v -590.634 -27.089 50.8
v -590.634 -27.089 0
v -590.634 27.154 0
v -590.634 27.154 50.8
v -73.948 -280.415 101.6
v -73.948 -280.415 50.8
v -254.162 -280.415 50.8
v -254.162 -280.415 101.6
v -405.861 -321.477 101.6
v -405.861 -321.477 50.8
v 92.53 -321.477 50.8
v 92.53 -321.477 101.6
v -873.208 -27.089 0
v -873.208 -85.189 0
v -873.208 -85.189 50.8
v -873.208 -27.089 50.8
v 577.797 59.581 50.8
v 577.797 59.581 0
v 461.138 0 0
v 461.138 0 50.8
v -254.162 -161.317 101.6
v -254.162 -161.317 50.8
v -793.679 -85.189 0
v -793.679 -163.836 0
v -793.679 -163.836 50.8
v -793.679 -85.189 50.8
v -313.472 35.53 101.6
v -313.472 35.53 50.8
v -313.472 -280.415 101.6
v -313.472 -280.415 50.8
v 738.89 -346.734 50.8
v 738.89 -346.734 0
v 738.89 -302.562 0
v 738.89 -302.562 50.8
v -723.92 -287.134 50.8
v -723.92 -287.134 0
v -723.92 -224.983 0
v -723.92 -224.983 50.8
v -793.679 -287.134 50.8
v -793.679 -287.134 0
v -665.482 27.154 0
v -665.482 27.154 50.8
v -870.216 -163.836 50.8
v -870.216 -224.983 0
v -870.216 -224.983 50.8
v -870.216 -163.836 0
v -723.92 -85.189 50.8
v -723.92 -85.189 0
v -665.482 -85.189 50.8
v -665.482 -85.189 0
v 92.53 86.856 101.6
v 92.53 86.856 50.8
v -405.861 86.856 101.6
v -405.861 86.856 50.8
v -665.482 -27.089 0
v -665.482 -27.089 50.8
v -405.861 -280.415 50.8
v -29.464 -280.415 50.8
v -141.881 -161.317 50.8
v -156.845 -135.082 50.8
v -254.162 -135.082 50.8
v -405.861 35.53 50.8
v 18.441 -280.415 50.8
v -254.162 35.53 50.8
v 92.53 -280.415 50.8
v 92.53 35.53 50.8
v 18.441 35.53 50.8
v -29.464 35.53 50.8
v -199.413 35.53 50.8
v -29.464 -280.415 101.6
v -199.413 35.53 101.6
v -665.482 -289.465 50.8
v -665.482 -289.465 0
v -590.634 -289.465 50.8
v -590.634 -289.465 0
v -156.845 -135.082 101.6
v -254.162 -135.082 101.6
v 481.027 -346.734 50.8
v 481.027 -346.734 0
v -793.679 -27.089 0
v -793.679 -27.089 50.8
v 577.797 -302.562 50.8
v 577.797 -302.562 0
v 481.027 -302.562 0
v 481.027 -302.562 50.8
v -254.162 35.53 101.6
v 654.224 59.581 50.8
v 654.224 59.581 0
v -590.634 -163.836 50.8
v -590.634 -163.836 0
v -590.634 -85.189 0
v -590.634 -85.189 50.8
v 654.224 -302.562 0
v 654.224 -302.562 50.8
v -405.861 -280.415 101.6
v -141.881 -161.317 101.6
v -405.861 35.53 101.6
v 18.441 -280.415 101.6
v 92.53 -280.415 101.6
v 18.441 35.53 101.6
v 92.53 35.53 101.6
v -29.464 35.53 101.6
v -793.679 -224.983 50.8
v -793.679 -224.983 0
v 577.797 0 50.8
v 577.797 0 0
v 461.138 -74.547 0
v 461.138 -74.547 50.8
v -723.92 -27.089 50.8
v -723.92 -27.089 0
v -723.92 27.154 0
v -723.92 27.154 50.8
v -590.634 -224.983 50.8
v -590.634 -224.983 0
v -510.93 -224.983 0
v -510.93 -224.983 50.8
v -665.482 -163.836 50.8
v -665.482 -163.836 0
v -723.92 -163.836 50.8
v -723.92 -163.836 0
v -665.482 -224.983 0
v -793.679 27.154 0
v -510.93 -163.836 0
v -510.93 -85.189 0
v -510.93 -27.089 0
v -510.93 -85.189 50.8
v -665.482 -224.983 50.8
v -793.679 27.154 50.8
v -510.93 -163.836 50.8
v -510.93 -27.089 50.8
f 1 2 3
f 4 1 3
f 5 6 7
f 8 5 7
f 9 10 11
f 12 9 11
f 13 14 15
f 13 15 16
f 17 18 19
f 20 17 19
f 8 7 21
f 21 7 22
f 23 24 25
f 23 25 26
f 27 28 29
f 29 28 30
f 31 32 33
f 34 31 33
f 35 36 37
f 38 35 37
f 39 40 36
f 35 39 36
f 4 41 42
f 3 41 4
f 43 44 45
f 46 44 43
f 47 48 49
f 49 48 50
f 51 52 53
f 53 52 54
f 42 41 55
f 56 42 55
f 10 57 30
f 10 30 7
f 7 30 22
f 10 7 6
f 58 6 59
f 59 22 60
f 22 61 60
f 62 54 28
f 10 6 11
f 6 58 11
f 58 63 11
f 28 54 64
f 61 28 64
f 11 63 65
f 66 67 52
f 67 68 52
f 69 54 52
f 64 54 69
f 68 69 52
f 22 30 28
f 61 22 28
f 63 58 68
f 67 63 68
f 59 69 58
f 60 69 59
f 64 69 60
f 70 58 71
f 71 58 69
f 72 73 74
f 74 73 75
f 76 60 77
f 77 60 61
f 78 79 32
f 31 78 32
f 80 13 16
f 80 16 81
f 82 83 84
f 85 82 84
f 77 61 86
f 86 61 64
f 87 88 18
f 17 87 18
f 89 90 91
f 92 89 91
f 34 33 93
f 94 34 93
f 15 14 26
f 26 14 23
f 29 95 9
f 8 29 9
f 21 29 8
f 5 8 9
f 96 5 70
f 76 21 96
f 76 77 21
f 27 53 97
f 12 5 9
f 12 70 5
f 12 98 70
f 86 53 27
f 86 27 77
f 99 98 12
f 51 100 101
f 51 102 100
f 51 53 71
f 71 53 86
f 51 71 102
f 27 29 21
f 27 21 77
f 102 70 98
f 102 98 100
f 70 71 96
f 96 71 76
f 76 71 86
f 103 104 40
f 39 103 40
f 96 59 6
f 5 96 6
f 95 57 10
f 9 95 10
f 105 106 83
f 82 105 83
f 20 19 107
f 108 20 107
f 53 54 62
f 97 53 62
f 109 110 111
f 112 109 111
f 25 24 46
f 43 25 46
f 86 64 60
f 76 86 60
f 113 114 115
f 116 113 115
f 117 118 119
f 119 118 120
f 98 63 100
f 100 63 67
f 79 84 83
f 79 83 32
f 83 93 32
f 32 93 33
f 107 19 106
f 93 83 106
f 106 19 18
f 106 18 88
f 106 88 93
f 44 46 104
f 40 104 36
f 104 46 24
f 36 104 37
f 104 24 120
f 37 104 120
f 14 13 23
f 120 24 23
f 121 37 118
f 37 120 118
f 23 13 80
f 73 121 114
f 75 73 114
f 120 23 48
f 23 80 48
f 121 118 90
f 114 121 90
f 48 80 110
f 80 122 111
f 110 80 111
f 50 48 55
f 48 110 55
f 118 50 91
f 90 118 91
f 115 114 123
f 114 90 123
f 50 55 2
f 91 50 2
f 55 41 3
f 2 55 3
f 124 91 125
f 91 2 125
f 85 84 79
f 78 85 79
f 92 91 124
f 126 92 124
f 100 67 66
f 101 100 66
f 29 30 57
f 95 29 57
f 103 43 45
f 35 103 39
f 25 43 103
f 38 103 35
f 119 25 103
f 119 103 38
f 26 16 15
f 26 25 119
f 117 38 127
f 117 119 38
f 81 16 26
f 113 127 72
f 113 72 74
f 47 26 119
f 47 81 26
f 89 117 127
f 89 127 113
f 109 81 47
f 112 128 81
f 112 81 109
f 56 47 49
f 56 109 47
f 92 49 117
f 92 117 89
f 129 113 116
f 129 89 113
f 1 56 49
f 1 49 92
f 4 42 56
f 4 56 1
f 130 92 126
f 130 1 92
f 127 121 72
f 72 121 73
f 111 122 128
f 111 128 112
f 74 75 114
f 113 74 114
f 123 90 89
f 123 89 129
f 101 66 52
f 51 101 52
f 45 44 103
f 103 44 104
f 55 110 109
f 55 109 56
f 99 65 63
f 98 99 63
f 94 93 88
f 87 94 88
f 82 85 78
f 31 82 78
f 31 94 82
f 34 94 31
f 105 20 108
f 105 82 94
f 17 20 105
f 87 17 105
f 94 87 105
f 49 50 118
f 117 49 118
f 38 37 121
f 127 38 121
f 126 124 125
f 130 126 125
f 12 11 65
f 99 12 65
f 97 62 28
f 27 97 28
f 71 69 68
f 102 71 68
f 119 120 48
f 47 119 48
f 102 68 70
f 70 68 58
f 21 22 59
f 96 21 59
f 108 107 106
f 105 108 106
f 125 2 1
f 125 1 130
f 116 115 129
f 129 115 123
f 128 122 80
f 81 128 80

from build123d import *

# Parameters (mm, degrees)
F0_W      = 59.3109130859
F0_H      = 315.944686532
F1_DEPTH  = 50.8
F2_W      = 47.9049701244
F2_H      = 315.944686532
F3_DEPTH  = 2.54
F4_DEPTH  = 50.8
F5_W      = 69.7591304779
F5_H      = 54.2430207133
F5_H_2    = 58.1001080573
F5_W_2    = 79.5288085938
F5_W_3    = 74.8479366302
F5_W_4    = 58.4374070168
F5_W_5    = 79.7038674355
F5_H_3    = 78.646697104
F5_H_4    = 61.1479729414
F5_H_5    = 64.4819140434
F5_H_6    = 62.1507763863
F5_W_6    = 76.5372514725
F6_DEPTH  = 50.8
F8_DEPTH  = 50.8
F11_DEPTH = 50.8


with BuildPart() as f1:
    # F0 (on Top) → F1 (new body)
    with BuildSketch(Plane.XY):
        Polygon((317.2763288021, 86.8562683463), (-405.860632658, 86.8562683463), (-405.860632658, 35.5295091867), (-313.4724795818, 35.5295091867), (-254.1615664959, 35.5295091867), (317.2763288021, 35.5295091867), align=None)
        with Locations((-283.8170230389, -122.4428340793)):
            Rectangle(F0_W, F0_H)
        Polygon((-254.1615664959, -280.4151773453), (-313.4724795818, -280.4151773453), (-405.860632658, -280.4151773453), (-405.860632658, -321.4765787125), (329.8228383064, -321.4765787125), (329.8228383064, -280.4151773453), align=None)
    extrude(amount=F1_DEPTH)

    # F2 (on face) → F3 (join)
    with BuildSketch(Plane.XY.offset(50.8)):
        Polygon((-141.8810272457, -161.3167375326), (-156.8449797478, -135.0824683905), (-254.1615664959, -135.0824683905), (-254.1615664959, -161.3167375326), align=None)
        Polygon((-199.4130164385, 35.5295091867), (-254.1615664959, 35.5295091867), (-156.8449797478, -135.0824683905), (-141.8810272457, -161.3167375326), (-73.9476159215, -280.4151773453), (-29.4644292444, -280.4151773453), align=None)
        with Locations((-5.5119441822, -122.4428340793)):
            Rectangle(F2_W, F2_H)
    extrude(amount=-F3_DEPTH)

    # F4 (add): faces of the model
    f4_faces = [f1.faces().sort_by_distance(p)[0] for p in [
        (-5.5119441822, -122.4428340793, 48.26),
        (-44.2921519279, 78.4421974919, 50.8),
    ]]
    extrude(f4_faces, amount=F4_DEPTH, dir=(0, 0, -1))


with BuildPart() as f6:
    # F5 (on Top) → F6 (new body)
    with BuildSketch(Plane.XY):
        with Locations((-758.7992548943, 0.0328049064)):
            Rectangle(F5_W, F5_H)
        with Locations((-758.7992548943, -56.1387594789)):
            Rectangle(F5_W, F5_H_2)
        with Locations((-833.4432244301, -56.1387594789)):
            Rectangle(F5_W_2, F5_H_2)
        with Locations((-628.0583143234, -56.1387594789)):
            Rectangle(F5_W_3, F5_H_2)
        with Locations((-628.0583143234, 0.0328049064)):
            Rectangle(F5_W_3, F5_H)
        with Locations((-694.7009861469, -56.1387594789)):
            Rectangle(F5_W_4, F5_H_2)
        with Locations((-550.7824122906, -56.1387594789)):
            Rectangle(F5_W_5, F5_H_2)
        with Locations((-628.0583143234, -124.5121620595)):
            Rectangle(F5_W_3, F5_H_3)
        with Locations((-628.0583143234, -194.4094970822)):
            Rectangle(F5_W_3, F5_H_4)
        with Locations((-550.7824122906, -194.4094970822)):
            Rectangle(F5_W_5, F5_H_4)
        with Locations((-628.0583143234, -257.2244405746)):
            Rectangle(F5_W_3, F5_H_5)
        with Locations((-694.7009861469, -194.4094970822)):
            Rectangle(F5_W_4, F5_H_4)
        with Locations((-758.7992548943, -256.0588717461)):
            Rectangle(F5_W, F5_H_6)
        with Locations((-758.7992548943, -194.4094970822)):
            Rectangle(F5_W, F5_H_4)
        with Locations((-831.9474458694, -194.4094970822)):
            Rectangle(F5_W_6, F5_H_4)
        with Locations((-758.7992548943, -124.5121620595)):
            Rectangle(F5_W, F5_H_3)
    extrude(amount=F6_DEPTH)


with BuildPart() as f8:
    # F7 (on Top) → F8 (new body)
    with BuildSketch(Plane.XY):
        Polygon((654.2241573334, 59.5809501186), (577.7968168259, 59.5809501186), (577.7968168259, 0), (577.7968168259, -302.5620281696), (654.2241573334, -302.5620281696), align=None)
        Polygon((738.8895750046, -302.5620281696), (654.2241573334, -302.5620281696), (577.7968168259, -302.5620281696), (481.0267984867, -302.5620281696), (481.0267984867, -346.7342216172), (738.8895750046, -346.7342216172), align=None)
        Polygon((577.7968168259, 0), (577.7968168259, 59.5809501186), (461.1376523972, 0), (461.1376523972, -74.5469406247), align=None)
    extrude(amount=F8_DEPTH)


with BuildPart() as f11:
    # F9 (on face) → F11 (new body)
    with BuildSketch(Plane.XY.offset(50.8)):
        Polygon((92.5298333168, 35.5295091867), (92.5298333168, 86.8562683463), (-405.860632658, 86.8562683463), (-405.860632658, 35.5295091867), (-313.4724795818, 35.5295091867), (-313.4724795818, -280.4151773453), (-405.860632658, -280.4151773453), (-405.860632658, -321.4765787125), (92.5298333168, -321.4765787125), (92.5298333168, -280.4151773453), (18.44054088, -280.4151773453), (18.44054088, 35.5295091867), align=None)
        Polygon((-141.8810272457, -161.3167375326), (-73.9476159215, -280.4151773453), (-254.1615664959, -280.4151773453), (-254.1615664959, -161.3167375326), align=None, mode=Mode.SUBTRACT)
        Polygon((-29.4644292444, -280.4151773453), (-199.4130164385, 35.5295091867), (-29.4644292444, 35.5295091867), align=None, mode=Mode.SUBTRACT)
        Polygon((-156.8449797478, -135.0824683905), (-254.1615664959, -135.0824683905), (-254.1615664959, 35.5295091867), align=None, mode=Mode.SUBTRACT)
    extrude(amount=F11_DEPTH)


solid = Compound([f6.part, f8.part, f11.part])
